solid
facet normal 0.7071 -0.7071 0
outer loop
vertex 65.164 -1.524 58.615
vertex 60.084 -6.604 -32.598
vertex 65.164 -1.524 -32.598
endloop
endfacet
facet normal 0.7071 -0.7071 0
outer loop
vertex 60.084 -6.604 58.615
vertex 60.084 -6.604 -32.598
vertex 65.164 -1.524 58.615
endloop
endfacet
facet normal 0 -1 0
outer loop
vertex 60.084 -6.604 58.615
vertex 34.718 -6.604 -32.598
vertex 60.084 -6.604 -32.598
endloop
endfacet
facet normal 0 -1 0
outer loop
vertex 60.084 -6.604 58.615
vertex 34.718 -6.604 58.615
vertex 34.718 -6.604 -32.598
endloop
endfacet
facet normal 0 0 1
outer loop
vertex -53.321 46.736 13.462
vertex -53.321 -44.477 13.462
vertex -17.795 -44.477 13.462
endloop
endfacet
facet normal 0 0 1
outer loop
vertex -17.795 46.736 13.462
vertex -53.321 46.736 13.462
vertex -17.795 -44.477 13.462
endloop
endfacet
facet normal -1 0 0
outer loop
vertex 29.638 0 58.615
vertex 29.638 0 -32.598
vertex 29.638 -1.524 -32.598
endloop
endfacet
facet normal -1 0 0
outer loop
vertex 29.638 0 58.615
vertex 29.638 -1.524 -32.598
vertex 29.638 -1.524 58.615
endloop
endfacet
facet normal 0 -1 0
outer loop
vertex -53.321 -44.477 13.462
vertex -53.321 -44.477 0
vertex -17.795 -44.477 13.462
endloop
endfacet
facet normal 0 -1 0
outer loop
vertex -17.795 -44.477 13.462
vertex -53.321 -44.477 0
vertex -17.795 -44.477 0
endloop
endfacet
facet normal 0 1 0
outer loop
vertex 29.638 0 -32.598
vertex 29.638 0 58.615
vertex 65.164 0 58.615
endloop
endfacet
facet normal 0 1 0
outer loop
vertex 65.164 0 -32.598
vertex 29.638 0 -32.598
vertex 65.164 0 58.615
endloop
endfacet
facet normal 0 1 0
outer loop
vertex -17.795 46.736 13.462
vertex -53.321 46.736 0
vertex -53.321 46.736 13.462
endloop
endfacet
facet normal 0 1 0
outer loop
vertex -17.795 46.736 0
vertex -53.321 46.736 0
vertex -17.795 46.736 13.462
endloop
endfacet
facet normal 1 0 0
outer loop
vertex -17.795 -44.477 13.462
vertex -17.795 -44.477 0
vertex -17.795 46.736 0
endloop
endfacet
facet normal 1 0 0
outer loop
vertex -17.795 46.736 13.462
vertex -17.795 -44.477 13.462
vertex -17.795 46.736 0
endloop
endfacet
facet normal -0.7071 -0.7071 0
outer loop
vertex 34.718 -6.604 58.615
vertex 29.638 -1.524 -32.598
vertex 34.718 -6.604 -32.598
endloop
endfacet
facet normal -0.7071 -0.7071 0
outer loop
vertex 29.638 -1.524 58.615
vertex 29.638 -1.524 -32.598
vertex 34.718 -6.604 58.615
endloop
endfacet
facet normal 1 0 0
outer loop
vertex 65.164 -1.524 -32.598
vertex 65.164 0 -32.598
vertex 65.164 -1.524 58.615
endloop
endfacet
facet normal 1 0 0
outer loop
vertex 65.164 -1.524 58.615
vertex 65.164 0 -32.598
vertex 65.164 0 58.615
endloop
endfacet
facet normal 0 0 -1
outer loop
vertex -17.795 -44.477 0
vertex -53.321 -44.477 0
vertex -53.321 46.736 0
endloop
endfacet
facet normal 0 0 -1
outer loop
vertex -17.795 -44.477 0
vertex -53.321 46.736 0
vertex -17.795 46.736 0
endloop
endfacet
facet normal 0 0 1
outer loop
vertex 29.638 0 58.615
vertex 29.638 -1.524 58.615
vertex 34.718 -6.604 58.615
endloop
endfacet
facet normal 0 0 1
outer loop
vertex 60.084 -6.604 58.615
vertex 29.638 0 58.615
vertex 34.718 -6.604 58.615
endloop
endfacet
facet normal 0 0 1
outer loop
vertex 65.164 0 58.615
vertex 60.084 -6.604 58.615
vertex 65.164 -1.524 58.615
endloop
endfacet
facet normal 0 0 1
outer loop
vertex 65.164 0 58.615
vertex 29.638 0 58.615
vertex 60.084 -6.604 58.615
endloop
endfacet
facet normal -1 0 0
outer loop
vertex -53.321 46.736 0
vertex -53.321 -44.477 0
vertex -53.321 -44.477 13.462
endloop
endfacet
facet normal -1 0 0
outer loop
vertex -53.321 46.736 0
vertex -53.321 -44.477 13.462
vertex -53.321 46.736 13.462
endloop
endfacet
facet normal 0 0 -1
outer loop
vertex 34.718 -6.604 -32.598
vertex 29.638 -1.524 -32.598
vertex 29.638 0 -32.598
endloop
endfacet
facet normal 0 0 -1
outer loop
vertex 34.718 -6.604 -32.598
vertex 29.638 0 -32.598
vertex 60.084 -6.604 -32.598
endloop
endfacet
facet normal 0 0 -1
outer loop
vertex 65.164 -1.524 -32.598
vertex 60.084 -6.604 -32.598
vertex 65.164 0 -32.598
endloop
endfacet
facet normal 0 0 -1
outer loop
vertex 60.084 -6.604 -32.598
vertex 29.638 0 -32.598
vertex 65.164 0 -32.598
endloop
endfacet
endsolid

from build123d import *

# Parameters (mm, degrees)
F0_W     = 35.526406
F0_H     = 91.212823
F1_DEPTH = 13.462
F2_W     = 35.526405
F2_H     = 91.212824
F3_DEPTH = 6.604
F4_SIZE  = 5.08
F5_SIZE  = 5.08


with BuildPart() as f1:
    # F0 (on Top) → F1 (new body)
    with BuildSketch(Plane.XY):
        with Locations((-35.558051, 1.129285)):
            Rectangle(F0_W, F0_H)
    extrude(amount=F1_DEPTH)


with BuildPart() as f3:
    # F2 (on Front) → F3 (new body)
    with BuildSketch(Plane.XZ):
        with Locations((47.400979, 13.008611)):
            Rectangle(F2_W, F2_H)
    extrude(amount=F3_DEPTH)

    # F4
    f4_edges = [f3.edges().sort_by_distance(p)[0] for p in [
        (65.164182, -6.604, 13.008611),
    ]]
    chamfer(f4_edges, length=F4_SIZE)

    # F5
    f5_edges = [f3.edges().sort_by_distance(p)[0] for p in [
        (29.637777, -6.604, 13.008611),
    ]]
    chamfer(f5_edges, length=F5_SIZE)


solid = Compound([f1.part, f3.part])
